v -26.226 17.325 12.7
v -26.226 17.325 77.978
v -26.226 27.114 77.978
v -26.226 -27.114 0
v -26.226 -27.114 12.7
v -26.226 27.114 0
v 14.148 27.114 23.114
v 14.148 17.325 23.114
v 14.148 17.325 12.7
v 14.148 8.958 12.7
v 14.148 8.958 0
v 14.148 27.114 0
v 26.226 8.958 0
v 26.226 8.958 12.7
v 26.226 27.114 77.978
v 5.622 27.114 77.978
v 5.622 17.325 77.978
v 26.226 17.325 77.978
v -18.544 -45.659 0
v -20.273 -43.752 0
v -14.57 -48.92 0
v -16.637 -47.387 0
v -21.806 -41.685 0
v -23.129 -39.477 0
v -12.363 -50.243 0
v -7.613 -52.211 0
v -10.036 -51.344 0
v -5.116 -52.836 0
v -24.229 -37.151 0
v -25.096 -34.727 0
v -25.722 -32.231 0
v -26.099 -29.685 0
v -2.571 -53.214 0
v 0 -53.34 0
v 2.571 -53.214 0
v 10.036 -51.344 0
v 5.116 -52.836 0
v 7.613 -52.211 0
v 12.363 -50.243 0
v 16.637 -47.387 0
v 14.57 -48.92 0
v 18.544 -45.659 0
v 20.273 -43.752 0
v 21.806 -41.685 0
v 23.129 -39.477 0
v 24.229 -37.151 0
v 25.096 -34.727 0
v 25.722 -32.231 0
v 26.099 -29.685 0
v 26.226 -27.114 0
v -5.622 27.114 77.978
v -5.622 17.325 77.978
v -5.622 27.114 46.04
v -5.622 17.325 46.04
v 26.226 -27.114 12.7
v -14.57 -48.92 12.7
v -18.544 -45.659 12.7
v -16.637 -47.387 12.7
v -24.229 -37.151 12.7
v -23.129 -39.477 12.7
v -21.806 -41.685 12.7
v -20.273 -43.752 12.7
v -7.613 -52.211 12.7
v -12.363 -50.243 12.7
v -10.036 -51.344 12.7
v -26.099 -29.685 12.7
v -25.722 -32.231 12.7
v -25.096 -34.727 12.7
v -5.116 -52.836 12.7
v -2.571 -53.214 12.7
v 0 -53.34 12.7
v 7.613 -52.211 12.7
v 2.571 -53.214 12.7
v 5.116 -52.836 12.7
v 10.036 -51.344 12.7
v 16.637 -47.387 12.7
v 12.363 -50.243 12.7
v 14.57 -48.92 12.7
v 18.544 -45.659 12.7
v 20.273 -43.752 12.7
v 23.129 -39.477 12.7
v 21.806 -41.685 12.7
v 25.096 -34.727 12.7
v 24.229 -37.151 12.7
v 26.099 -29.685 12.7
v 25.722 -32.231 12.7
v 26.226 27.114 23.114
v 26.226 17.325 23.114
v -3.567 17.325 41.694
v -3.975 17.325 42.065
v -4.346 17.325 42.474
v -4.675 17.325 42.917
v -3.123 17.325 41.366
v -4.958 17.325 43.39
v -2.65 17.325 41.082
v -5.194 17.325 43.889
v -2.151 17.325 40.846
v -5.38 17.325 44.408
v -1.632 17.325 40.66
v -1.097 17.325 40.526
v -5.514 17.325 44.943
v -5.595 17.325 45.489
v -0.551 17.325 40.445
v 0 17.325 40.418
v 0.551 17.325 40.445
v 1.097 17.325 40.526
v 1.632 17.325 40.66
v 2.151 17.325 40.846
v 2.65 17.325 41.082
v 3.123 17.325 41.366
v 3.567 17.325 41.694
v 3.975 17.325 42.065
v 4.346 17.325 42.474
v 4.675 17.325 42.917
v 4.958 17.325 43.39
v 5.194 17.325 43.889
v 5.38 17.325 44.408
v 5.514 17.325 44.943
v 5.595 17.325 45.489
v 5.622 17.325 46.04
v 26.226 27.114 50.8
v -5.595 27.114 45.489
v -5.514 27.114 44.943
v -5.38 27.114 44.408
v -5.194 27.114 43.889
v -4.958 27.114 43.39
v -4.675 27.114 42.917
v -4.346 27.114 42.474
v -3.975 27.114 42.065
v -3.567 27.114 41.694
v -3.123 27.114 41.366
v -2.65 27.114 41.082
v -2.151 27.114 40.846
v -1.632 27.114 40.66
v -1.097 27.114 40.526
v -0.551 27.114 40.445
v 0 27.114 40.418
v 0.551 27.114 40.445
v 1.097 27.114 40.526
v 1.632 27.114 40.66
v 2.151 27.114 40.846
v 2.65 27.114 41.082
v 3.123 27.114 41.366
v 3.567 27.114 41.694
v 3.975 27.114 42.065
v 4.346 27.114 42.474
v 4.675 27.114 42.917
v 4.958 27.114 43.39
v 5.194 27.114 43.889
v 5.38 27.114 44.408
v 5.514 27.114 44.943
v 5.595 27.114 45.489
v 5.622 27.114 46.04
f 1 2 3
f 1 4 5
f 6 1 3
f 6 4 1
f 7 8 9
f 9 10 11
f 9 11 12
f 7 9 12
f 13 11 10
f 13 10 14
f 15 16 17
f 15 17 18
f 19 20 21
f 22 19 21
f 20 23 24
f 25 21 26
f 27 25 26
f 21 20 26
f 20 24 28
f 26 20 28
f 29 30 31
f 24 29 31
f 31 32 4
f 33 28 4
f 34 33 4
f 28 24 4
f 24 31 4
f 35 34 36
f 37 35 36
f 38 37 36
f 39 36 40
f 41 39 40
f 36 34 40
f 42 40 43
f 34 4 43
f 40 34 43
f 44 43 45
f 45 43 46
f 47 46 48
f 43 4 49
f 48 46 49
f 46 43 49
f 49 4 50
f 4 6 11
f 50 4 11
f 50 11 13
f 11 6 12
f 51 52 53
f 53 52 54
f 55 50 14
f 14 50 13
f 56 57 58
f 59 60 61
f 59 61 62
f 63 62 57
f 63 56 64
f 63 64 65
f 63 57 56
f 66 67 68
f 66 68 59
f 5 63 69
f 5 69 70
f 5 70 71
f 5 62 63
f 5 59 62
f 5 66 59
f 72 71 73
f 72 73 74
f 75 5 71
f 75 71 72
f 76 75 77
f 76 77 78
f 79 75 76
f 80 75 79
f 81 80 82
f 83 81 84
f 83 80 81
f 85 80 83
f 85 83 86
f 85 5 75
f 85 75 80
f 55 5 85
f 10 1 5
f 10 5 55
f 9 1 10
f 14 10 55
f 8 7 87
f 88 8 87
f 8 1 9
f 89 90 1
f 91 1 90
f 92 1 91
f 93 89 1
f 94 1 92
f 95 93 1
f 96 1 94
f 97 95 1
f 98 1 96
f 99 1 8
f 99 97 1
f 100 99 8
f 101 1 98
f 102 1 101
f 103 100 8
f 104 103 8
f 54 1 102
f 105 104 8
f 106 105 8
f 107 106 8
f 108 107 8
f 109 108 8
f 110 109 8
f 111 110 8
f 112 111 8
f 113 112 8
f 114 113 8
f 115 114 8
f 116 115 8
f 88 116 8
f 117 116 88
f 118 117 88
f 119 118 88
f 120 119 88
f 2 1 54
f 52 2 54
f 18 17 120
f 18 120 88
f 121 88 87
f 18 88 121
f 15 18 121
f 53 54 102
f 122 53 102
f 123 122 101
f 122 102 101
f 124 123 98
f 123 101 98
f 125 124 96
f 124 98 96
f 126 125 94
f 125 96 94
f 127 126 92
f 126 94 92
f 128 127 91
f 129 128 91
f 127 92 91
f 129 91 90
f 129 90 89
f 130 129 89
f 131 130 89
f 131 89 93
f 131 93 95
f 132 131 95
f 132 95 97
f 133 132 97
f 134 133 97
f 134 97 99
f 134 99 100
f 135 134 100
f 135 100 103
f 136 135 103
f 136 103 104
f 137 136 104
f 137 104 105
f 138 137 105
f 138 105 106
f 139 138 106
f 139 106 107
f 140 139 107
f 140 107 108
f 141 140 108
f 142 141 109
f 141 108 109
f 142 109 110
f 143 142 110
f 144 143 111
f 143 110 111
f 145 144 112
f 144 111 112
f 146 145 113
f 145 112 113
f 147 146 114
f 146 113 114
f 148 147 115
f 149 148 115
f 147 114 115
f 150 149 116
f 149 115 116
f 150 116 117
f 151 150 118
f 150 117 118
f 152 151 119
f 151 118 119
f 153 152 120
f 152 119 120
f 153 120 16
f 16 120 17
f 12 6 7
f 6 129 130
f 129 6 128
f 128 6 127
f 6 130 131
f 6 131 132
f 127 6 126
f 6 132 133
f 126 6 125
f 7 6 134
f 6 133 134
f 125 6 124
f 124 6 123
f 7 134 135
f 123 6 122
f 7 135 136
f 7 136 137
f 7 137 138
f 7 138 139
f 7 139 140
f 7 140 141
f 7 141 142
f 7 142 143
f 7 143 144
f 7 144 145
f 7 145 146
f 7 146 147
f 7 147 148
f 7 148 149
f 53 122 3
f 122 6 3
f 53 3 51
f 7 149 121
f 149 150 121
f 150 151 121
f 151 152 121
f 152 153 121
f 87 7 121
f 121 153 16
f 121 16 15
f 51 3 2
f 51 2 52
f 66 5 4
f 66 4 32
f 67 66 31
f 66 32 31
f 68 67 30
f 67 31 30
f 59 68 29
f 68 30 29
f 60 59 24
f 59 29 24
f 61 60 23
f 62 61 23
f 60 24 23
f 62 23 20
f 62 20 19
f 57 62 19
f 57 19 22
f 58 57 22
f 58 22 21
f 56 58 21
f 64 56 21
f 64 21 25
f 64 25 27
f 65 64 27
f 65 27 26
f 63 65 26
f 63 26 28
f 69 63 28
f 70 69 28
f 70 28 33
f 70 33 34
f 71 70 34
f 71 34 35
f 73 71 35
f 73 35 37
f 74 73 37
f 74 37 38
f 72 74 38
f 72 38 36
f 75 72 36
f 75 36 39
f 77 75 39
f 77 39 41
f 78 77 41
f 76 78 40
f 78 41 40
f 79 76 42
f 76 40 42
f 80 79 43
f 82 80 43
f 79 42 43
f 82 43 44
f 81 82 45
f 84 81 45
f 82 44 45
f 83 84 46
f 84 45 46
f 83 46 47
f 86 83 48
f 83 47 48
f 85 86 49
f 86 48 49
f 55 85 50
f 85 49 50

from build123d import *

# Parameters (mm, degrees)
F0_W      = 52.4510033429
F0_H      = 54.2289987206
F2_DEPTH  = 25.4
F3_W      = 52.4510033429
F3_H      = 9.7890347242
F4_DEPTH  = 65.024
F5_W      = 12.0777860284
F5_H      = 18.1565545499
F6_DEPTH  = 50.8
F7_DEPTH  = 12.7
F8_DEPTH  = 12.446
F9_DEPTH  = 27.686
F10_W     = 11.244142428
F10_H     = 31.9378077536
F10_H_2   = 5.1374584885
F11_DEPTH = 65.278


with BuildPart() as f2:
    # F0 (on Top) → F2 (new body)
    with BuildSketch(Plane.XY):
        with BuildLine():
            ThreePointArc((-26.2255016714, -27.1144993603), (0, -53.3400010318), (26.2255016714, -27.1144993603))
            Line((26.2255016714, -27.1144993603), (-26.2255016714, -27.1144993603))
        make_face()
        Rectangle(F0_W, F0_H)
    extrude(amount=F2_DEPTH)

    # F3 (on face) → F4 (join)
    with BuildSketch(Plane.XY.offset(25.4)):
        with Locations((0, 22.2199819982)):
            Rectangle(F3_W, F3_H)
    extrude(amount=F4_DEPTH)

    # F5 (on face) → F6 (cut)
    with BuildSketch(Plane.XY):
        with Locations((20.1866086572, 18.0362220854)):
            Rectangle(F5_W, F5_H)
    extrude(amount=F6_DEPTH, mode=Mode.SUBTRACT)

    # F7 (cut): a face of the model
    f7_faces = [f2.faces().sort_by_distance(p)[0] for p in [
        (-0.6162983013, -16.3297638345, 25.4),
    ]]
    extrude(f7_faces, amount=-F7_DEPTH, mode=Mode.SUBTRACT)

    # F8 (cut): a face of the model
    f8_faces = [f2.faces().sort_by_distance(p)[0] for p in [
        (0, 22.2199819982, 90.424),
    ]]
    extrude(f8_faces, amount=-F8_DEPTH, mode=Mode.SUBTRACT)

    # F9 (add): a face of the model
    f9_faces = [f2.faces().sort_by_distance(p)[0] for p in [
        (20.1866086572, 22.2199819982, 50.8),
    ]]
    extrude(f9_faces, amount=F9_DEPTH)

    # F10 (on face) → F11 (cut)
    with BuildSketch(Plane.XZ.offset(-17.3254646361)):
        with Locations((0, 62.0090961232)):
            Rectangle(F10_W, F10_H)
        with BuildLine():
            ThreePointArc((-5.622071214, 46.0401922464), (0, 40.4181210324), (5.622071214, 46.0401922464))
            Line((5.622071214, 46.0401922464), (-5.622071214, 46.0401922464))
        make_face()
        with Locations((0, 80.5467292442)):
            Rectangle(F10_W, F10_H_2)
    extrude(amount=-F11_DEPTH, mode=Mode.SUBTRACT)


solid = f2.part
